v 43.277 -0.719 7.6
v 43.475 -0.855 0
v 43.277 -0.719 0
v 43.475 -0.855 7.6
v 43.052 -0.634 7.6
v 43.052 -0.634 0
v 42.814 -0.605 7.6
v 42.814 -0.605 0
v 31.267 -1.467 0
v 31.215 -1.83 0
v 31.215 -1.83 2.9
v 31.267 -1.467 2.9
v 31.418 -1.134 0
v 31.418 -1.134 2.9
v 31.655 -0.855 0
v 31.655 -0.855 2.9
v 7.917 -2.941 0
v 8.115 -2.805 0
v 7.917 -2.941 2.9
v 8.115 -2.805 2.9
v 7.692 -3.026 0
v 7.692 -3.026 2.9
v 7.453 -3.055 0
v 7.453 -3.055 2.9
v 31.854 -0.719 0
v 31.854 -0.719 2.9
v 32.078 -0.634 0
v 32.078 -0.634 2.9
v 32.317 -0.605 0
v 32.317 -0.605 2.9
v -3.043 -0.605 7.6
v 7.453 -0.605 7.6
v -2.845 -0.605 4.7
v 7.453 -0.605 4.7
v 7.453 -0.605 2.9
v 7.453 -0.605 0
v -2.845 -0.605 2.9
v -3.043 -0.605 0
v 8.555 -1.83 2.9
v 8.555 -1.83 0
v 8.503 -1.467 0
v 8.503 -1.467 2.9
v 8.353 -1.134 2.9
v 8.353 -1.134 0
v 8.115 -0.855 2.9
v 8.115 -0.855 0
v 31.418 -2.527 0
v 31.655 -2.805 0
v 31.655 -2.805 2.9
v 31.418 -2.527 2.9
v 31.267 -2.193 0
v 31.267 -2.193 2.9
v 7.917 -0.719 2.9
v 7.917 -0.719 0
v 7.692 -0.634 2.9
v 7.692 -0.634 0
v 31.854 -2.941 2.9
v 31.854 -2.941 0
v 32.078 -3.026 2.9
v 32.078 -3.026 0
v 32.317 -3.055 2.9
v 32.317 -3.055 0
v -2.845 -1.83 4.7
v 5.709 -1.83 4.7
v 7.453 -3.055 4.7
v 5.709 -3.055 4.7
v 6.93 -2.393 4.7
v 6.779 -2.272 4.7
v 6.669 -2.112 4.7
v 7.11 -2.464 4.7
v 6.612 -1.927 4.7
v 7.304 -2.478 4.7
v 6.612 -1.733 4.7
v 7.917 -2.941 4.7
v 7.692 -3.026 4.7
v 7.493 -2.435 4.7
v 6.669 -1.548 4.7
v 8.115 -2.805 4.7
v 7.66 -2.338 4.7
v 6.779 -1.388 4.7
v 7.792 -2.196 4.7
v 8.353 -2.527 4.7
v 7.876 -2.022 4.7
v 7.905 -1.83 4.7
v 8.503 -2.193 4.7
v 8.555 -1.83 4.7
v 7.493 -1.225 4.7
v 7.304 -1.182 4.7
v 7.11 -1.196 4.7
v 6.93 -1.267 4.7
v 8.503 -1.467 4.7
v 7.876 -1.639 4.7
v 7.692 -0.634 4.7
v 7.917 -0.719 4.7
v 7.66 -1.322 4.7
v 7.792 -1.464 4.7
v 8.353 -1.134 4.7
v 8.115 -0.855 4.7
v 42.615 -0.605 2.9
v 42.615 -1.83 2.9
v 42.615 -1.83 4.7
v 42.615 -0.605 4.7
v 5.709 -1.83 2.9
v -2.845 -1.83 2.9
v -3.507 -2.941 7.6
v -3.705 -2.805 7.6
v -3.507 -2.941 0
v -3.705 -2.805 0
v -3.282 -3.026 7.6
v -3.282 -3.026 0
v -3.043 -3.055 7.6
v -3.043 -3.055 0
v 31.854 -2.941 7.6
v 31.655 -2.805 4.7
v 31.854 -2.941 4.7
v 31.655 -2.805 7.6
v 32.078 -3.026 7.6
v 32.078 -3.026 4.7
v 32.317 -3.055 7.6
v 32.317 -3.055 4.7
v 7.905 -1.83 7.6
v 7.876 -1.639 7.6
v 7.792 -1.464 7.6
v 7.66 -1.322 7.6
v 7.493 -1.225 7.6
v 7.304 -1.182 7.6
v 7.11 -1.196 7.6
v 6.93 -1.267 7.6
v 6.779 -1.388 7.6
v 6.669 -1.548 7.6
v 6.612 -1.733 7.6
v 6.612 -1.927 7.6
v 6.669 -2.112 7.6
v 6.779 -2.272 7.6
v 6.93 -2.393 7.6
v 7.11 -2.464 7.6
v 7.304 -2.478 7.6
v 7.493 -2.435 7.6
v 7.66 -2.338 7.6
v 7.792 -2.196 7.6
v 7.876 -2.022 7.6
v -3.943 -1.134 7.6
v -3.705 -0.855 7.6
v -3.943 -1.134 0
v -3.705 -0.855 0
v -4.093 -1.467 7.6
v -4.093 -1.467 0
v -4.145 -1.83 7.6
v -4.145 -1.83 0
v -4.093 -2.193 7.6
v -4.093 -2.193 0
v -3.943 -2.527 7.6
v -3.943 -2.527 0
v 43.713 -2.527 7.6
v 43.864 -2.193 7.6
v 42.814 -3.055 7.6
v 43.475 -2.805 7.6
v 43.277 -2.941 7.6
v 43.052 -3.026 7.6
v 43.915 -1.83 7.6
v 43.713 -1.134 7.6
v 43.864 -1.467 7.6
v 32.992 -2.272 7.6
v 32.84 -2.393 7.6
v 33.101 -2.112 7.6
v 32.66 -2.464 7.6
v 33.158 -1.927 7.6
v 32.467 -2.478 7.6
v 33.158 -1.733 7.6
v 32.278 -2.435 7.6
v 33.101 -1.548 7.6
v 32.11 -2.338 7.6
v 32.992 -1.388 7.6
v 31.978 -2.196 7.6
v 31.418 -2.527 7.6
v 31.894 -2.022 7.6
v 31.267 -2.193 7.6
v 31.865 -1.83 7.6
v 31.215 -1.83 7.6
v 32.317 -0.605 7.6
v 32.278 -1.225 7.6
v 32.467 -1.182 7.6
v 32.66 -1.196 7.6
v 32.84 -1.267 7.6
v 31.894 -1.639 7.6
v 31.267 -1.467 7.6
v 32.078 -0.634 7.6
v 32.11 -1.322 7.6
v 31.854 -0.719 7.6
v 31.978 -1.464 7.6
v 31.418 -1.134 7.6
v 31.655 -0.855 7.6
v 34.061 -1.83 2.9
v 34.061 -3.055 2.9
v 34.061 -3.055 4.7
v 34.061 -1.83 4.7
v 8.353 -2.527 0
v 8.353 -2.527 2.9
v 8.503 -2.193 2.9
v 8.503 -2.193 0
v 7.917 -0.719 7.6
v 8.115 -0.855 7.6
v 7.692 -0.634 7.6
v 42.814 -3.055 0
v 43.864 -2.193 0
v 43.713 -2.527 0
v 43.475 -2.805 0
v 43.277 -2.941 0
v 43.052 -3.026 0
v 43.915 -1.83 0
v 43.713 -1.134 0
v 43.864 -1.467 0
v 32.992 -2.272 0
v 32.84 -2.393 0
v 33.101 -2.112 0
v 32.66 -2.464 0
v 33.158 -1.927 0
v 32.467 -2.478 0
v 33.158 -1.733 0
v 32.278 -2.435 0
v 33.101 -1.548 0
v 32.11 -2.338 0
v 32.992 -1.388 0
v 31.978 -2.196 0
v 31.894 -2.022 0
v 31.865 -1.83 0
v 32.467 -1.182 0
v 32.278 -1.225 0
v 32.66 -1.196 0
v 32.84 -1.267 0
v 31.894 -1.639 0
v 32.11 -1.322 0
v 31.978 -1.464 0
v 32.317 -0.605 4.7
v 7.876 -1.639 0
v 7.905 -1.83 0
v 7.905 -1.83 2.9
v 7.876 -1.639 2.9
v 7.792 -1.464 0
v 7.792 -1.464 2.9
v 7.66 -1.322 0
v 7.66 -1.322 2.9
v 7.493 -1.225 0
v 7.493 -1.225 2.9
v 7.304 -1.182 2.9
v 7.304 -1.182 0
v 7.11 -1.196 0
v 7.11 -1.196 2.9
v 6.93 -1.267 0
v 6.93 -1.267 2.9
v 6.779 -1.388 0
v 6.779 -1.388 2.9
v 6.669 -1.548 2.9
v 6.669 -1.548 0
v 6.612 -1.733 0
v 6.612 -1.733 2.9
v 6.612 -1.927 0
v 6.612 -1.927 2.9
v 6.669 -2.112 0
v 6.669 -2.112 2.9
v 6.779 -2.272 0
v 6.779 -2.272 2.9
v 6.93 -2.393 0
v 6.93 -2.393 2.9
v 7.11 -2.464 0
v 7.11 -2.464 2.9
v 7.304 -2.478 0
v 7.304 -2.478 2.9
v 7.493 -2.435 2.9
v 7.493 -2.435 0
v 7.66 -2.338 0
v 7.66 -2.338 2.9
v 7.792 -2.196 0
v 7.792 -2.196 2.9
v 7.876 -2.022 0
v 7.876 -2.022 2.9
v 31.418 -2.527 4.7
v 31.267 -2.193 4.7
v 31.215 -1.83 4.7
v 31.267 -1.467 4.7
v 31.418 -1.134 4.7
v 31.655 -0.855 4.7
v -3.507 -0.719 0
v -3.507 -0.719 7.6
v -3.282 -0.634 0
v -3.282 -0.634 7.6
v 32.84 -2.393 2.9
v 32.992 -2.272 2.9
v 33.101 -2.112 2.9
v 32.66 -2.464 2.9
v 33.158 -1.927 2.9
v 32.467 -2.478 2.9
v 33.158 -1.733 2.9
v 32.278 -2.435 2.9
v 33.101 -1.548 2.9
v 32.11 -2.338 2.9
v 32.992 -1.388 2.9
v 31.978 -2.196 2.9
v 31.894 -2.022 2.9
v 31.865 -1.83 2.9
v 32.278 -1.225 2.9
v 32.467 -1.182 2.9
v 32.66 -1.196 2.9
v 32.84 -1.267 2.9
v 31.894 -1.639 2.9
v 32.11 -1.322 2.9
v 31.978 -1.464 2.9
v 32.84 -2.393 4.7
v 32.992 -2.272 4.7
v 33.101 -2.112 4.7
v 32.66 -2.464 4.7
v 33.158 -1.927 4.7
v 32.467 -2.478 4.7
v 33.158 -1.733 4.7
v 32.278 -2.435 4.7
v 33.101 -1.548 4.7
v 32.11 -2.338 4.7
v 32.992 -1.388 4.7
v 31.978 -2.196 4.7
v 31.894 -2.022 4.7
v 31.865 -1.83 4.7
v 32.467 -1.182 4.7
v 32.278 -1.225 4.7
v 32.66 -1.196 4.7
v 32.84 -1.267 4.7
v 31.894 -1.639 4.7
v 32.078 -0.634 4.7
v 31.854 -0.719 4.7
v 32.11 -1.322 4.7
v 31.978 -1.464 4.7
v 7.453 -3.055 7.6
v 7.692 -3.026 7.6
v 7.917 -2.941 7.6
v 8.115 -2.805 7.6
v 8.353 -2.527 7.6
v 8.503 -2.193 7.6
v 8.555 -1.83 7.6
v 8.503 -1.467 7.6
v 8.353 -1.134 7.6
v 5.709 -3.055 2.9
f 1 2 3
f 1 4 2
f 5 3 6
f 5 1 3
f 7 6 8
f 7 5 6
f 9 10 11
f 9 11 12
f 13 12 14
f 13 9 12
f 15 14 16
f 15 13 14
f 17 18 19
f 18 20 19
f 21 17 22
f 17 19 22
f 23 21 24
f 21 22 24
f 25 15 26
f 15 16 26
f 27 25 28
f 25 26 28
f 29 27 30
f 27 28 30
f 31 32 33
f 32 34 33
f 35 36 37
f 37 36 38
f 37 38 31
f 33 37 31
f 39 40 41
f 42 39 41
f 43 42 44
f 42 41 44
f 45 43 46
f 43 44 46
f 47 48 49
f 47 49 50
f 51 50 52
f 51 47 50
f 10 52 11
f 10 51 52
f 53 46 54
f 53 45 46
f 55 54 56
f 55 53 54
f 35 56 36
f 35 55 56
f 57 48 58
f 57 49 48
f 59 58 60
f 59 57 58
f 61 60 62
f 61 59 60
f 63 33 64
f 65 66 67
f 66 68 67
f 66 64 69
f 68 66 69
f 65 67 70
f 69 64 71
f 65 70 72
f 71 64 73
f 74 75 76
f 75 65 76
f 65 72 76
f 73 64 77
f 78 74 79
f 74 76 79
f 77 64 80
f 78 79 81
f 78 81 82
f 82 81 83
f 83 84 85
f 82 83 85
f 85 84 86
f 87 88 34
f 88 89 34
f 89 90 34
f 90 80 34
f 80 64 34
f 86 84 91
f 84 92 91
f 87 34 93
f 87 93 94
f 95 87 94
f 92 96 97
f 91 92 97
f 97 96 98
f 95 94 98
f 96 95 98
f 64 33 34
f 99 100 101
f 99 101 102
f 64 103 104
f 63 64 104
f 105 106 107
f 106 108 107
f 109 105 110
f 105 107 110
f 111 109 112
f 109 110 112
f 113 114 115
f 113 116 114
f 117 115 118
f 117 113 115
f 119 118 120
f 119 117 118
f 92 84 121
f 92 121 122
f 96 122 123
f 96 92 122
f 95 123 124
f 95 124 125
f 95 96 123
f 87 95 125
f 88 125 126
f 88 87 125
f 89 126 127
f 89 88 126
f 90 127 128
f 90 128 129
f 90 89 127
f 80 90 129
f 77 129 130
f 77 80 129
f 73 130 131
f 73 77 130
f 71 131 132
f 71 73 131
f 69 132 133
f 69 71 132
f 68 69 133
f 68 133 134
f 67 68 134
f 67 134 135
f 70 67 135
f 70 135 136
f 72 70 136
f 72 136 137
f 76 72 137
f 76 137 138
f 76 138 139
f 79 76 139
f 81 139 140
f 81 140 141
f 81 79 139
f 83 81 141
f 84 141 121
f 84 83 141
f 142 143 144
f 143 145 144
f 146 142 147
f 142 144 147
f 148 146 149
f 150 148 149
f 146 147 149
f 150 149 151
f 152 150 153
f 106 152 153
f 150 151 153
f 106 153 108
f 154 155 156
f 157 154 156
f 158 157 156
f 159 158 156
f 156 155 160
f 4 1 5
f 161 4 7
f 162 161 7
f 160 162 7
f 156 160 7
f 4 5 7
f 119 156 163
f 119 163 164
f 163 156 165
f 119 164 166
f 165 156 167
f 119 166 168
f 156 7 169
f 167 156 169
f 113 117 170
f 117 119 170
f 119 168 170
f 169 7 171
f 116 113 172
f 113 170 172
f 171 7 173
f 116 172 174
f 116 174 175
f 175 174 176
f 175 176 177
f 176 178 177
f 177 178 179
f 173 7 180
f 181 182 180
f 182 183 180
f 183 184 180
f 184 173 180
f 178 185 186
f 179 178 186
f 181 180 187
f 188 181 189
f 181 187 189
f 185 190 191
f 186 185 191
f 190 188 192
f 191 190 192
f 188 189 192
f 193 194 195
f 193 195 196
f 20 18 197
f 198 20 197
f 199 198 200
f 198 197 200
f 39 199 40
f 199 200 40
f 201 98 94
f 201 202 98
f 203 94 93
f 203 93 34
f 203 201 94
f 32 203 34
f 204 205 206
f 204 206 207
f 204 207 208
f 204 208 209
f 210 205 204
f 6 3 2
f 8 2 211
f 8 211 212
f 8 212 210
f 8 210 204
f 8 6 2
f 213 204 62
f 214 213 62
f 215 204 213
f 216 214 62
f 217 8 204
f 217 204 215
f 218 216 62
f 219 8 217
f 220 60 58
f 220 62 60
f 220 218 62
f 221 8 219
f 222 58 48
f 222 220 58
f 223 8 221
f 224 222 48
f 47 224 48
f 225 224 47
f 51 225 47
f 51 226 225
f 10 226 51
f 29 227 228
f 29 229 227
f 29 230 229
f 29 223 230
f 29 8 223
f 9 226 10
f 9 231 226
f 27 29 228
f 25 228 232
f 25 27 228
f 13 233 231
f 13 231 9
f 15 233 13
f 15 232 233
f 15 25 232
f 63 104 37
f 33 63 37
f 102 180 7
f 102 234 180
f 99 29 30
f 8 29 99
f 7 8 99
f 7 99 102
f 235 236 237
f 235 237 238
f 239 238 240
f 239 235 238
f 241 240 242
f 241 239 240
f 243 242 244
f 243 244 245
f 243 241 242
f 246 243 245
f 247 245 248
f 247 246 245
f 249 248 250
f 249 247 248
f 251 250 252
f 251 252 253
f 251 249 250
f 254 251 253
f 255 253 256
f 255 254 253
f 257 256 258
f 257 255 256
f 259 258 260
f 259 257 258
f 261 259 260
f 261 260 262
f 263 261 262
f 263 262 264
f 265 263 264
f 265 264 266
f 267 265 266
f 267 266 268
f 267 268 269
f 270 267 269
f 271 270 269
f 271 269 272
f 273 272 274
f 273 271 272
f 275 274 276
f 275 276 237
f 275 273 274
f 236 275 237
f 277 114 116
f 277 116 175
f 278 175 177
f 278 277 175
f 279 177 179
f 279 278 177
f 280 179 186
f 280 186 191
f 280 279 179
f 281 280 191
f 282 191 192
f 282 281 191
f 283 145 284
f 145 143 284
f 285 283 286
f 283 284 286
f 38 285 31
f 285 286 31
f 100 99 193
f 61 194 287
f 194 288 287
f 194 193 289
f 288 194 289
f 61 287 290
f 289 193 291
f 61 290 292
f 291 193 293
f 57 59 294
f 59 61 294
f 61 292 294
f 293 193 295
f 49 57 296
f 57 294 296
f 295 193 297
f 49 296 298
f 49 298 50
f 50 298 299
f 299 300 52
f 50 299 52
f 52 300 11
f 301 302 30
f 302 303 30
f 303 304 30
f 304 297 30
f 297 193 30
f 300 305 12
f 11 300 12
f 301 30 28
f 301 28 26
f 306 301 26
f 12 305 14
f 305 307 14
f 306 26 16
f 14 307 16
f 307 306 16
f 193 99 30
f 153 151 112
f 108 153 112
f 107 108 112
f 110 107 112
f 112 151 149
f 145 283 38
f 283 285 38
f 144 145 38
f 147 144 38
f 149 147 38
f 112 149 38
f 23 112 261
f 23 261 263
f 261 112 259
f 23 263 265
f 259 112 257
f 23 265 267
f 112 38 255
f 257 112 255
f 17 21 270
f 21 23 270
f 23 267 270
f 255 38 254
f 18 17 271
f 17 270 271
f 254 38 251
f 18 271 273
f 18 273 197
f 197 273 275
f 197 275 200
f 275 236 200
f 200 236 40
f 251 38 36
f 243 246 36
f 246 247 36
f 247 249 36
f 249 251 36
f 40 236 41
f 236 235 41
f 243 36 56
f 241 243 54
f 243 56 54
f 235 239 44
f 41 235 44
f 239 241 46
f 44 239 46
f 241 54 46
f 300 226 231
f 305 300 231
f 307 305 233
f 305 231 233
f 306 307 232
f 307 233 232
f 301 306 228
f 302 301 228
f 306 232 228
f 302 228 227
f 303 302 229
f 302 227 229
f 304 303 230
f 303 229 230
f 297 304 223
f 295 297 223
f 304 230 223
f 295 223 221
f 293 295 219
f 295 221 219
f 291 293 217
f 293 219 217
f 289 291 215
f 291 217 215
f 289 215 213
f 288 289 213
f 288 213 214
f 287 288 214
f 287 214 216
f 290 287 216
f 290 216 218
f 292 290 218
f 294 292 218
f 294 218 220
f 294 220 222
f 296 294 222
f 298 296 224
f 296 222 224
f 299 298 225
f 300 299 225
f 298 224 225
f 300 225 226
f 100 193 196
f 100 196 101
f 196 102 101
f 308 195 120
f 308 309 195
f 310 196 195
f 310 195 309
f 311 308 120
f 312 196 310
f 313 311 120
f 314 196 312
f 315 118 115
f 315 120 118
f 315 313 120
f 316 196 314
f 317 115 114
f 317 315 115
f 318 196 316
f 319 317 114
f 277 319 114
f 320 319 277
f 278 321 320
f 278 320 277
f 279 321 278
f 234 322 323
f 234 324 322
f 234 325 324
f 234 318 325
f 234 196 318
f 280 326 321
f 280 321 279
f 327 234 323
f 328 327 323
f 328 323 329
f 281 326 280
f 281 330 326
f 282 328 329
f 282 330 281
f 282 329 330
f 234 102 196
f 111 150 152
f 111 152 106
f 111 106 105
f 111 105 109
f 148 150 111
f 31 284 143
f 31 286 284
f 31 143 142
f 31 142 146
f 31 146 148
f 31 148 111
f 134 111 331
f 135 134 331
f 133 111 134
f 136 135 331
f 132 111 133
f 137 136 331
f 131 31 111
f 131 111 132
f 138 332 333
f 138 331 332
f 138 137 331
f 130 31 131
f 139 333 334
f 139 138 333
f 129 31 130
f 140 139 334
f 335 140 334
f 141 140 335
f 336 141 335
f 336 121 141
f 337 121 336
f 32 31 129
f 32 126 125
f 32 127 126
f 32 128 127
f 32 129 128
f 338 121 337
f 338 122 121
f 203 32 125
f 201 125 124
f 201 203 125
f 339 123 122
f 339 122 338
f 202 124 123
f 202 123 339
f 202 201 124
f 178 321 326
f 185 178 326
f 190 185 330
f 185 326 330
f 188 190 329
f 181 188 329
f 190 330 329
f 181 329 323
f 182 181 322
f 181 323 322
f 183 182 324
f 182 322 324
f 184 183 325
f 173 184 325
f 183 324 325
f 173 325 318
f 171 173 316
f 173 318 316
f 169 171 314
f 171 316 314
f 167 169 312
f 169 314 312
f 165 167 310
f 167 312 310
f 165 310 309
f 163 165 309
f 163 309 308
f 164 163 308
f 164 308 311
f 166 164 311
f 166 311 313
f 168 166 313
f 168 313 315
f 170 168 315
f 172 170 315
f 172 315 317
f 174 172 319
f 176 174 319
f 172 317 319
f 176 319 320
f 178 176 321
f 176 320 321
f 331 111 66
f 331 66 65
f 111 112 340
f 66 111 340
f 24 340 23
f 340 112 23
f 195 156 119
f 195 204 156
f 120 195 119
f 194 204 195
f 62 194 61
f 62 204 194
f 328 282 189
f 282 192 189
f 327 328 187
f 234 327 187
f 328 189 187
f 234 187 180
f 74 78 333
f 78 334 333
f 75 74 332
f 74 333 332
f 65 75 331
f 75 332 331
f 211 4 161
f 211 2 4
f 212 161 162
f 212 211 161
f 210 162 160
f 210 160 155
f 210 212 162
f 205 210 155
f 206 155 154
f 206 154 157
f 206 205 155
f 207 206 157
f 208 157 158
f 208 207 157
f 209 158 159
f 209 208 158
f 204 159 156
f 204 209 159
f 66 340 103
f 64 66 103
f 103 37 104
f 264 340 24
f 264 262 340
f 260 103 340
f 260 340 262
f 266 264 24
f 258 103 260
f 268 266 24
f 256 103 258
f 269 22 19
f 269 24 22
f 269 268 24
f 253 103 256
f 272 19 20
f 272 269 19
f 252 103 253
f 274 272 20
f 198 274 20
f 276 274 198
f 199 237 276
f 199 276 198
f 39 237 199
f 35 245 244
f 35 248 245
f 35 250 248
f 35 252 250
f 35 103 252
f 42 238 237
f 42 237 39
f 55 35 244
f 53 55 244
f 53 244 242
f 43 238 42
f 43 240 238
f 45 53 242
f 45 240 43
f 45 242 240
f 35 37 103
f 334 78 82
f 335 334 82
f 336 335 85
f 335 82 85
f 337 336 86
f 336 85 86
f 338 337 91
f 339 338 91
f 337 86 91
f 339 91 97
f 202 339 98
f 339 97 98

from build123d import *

# Parameters (mm, degrees)
F0_R     = 0.65
F1_DEPTH = 2.9
F2_DEPTH = 4.7
F3_R     = 0.65
F4_DEPTH = 2.9
F5_R     = 1


with BuildPart() as f1:
    # F0 (on Top) → F1 (new body)
    with BuildSketch(Plane.XY):
        with BuildLine():
            Line((5.7089678012, -3.0551114906), (7.6902039147, -3.0551114906))
            ThreePointArc((7.6902039147, -3.0551114906), (8.3170400316, -2.5798700872), (8.555031535, -1.8301114906))
            ThreePointArc((8.555031535, -1.8301114906), (8.3170400316, -1.0803528939), (7.6902039147, -0.6051114906))
            Line((7.6902039147, -0.6051114906), (1.4938830864, -0.6051114906))
            Line((1.4938830864, -0.6051114906), (-2.844968465, -0.6051114906))
            Line((-2.844968465, -0.6051114906), (-2.844968465, -1.8301114906))
            Line((-2.844968465, -1.8301114906), (5.7089678012, -1.8301114906))
            Line((5.7089678012, -1.8301114906), (5.7089678012, -3.0551114906))
        make_face()
        with Locations((7.255031535, -1.8301114906)):
            Circle(F0_R, mode=Mode.SUBTRACT)
        with BuildLine():
            Line((4.2914836667, -3.0551114906), (5.7089678012, -3.0551114906))
            Line((5.7089678012, -3.0551114906), (5.7089678012, -1.8301114906))
            Line((5.7089678012, -1.8301114906), (-2.844968465, -1.8301114906))
            Line((-2.844968465, -1.8301114906), (-2.844968465, -0.6051114906))
            Line((-2.844968465, -0.6051114906), (-3.2801408446, -0.6051114906))
            ThreePointArc((-3.2801408446, -0.6051114906), (-4.144968465, -1.8301114906), (-3.2801408446, -3.0551114906))
            Line((-3.2801408446, -3.0551114906), (4.2914836667, -3.0551114906))
        make_face()
    extrude(amount=F1_DEPTH)

    # F0 (on Top) → F2 (join)
    with BuildSketch(Plane.XY):
        with BuildLine():
            Line((4.2914836667, -3.0551114906), (5.7089678012, -3.0551114906))
            Line((5.7089678012, -3.0551114906), (5.7089678012, -1.8301114906))
            Line((5.7089678012, -1.8301114906), (-2.844968465, -1.8301114906))
            Line((-2.844968465, -1.8301114906), (-2.844968465, -0.6051114906))
            Line((-2.844968465, -0.6051114906), (-3.2801408446, -0.6051114906))
            ThreePointArc((-3.2801408446, -0.6051114906), (-4.144968465, -1.8301114906), (-3.2801408446, -3.0551114906))
            Line((-3.2801408446, -3.0551114906), (4.2914836667, -3.0551114906))
        make_face()
    extrude(amount=F2_DEPTH)

    # F3 (on face) → F4 (join)
    with BuildSketch(Plane.XY.offset(4.7)):
        with BuildLine():
            ThreePointArc((7.6902039147, -3.0551114906), (8.555031535, -1.8301114906), (7.6902039147, -0.6051114906))
            Line((7.6902039147, -0.6051114906), (-2.844968465, -0.6051114906))
            Line((-2.844968465, -0.6051114906), (-2.844968465, -1.8301114906))
            Line((-2.844968465, -1.8301114906), (5.7089678012, -1.8301114906))
            Line((5.7089678012, -1.8301114906), (5.7089678012, -3.0551114906))
            Line((5.7089678012, -3.0551114906), (7.6902039147, -3.0551114906))
        make_face()
        with Locations((7.255031535, -1.8301114906)):
            Circle(F3_R, mode=Mode.SUBTRACT)
        with BuildLine():
            Line((-2.844968465, -1.8301114906), (-2.844968465, -0.6051114906))
            Line((-2.844968465, -0.6051114906), (-3.2801408446, -0.6051114906))
            ThreePointArc((-3.2801408446, -0.6051114906), (-4.144968465, -1.8301114906), (-3.2801408446, -3.0551114906))
            Line((-3.2801408446, -3.0551114906), (5.7089678012, -3.0551114906))
            Line((5.7089678012, -3.0551114906), (5.7089678012, -1.8301114906))
            Line((5.7089678012, -1.8301114906), (-2.844968465, -1.8301114906))
        make_face()
    extrude(amount=F4_DEPTH)

    # F5
    f5_edges = [f1.edges().sort_by_distance(p)[0] for p in [
        (7.690204, -0.605111, 6.15),
        (7.690204, -0.605111, 1.45),
        (-3.280141, -0.605111, 3.8),
        (7.690204, -3.055111, 6.15),
        (-3.280141, -3.055111, 3.8),
        (7.690204, -3.055111, 1.45),
    ]]
    fillet(f5_edges, radius=F5_R)


with BuildPart() as f8_1:
    # F8: instance of F1
    add(f1.part.mirror(Plane.YZ.offset(19.8851954192)))


solid = Compound([f1.part, f8_1.part])
